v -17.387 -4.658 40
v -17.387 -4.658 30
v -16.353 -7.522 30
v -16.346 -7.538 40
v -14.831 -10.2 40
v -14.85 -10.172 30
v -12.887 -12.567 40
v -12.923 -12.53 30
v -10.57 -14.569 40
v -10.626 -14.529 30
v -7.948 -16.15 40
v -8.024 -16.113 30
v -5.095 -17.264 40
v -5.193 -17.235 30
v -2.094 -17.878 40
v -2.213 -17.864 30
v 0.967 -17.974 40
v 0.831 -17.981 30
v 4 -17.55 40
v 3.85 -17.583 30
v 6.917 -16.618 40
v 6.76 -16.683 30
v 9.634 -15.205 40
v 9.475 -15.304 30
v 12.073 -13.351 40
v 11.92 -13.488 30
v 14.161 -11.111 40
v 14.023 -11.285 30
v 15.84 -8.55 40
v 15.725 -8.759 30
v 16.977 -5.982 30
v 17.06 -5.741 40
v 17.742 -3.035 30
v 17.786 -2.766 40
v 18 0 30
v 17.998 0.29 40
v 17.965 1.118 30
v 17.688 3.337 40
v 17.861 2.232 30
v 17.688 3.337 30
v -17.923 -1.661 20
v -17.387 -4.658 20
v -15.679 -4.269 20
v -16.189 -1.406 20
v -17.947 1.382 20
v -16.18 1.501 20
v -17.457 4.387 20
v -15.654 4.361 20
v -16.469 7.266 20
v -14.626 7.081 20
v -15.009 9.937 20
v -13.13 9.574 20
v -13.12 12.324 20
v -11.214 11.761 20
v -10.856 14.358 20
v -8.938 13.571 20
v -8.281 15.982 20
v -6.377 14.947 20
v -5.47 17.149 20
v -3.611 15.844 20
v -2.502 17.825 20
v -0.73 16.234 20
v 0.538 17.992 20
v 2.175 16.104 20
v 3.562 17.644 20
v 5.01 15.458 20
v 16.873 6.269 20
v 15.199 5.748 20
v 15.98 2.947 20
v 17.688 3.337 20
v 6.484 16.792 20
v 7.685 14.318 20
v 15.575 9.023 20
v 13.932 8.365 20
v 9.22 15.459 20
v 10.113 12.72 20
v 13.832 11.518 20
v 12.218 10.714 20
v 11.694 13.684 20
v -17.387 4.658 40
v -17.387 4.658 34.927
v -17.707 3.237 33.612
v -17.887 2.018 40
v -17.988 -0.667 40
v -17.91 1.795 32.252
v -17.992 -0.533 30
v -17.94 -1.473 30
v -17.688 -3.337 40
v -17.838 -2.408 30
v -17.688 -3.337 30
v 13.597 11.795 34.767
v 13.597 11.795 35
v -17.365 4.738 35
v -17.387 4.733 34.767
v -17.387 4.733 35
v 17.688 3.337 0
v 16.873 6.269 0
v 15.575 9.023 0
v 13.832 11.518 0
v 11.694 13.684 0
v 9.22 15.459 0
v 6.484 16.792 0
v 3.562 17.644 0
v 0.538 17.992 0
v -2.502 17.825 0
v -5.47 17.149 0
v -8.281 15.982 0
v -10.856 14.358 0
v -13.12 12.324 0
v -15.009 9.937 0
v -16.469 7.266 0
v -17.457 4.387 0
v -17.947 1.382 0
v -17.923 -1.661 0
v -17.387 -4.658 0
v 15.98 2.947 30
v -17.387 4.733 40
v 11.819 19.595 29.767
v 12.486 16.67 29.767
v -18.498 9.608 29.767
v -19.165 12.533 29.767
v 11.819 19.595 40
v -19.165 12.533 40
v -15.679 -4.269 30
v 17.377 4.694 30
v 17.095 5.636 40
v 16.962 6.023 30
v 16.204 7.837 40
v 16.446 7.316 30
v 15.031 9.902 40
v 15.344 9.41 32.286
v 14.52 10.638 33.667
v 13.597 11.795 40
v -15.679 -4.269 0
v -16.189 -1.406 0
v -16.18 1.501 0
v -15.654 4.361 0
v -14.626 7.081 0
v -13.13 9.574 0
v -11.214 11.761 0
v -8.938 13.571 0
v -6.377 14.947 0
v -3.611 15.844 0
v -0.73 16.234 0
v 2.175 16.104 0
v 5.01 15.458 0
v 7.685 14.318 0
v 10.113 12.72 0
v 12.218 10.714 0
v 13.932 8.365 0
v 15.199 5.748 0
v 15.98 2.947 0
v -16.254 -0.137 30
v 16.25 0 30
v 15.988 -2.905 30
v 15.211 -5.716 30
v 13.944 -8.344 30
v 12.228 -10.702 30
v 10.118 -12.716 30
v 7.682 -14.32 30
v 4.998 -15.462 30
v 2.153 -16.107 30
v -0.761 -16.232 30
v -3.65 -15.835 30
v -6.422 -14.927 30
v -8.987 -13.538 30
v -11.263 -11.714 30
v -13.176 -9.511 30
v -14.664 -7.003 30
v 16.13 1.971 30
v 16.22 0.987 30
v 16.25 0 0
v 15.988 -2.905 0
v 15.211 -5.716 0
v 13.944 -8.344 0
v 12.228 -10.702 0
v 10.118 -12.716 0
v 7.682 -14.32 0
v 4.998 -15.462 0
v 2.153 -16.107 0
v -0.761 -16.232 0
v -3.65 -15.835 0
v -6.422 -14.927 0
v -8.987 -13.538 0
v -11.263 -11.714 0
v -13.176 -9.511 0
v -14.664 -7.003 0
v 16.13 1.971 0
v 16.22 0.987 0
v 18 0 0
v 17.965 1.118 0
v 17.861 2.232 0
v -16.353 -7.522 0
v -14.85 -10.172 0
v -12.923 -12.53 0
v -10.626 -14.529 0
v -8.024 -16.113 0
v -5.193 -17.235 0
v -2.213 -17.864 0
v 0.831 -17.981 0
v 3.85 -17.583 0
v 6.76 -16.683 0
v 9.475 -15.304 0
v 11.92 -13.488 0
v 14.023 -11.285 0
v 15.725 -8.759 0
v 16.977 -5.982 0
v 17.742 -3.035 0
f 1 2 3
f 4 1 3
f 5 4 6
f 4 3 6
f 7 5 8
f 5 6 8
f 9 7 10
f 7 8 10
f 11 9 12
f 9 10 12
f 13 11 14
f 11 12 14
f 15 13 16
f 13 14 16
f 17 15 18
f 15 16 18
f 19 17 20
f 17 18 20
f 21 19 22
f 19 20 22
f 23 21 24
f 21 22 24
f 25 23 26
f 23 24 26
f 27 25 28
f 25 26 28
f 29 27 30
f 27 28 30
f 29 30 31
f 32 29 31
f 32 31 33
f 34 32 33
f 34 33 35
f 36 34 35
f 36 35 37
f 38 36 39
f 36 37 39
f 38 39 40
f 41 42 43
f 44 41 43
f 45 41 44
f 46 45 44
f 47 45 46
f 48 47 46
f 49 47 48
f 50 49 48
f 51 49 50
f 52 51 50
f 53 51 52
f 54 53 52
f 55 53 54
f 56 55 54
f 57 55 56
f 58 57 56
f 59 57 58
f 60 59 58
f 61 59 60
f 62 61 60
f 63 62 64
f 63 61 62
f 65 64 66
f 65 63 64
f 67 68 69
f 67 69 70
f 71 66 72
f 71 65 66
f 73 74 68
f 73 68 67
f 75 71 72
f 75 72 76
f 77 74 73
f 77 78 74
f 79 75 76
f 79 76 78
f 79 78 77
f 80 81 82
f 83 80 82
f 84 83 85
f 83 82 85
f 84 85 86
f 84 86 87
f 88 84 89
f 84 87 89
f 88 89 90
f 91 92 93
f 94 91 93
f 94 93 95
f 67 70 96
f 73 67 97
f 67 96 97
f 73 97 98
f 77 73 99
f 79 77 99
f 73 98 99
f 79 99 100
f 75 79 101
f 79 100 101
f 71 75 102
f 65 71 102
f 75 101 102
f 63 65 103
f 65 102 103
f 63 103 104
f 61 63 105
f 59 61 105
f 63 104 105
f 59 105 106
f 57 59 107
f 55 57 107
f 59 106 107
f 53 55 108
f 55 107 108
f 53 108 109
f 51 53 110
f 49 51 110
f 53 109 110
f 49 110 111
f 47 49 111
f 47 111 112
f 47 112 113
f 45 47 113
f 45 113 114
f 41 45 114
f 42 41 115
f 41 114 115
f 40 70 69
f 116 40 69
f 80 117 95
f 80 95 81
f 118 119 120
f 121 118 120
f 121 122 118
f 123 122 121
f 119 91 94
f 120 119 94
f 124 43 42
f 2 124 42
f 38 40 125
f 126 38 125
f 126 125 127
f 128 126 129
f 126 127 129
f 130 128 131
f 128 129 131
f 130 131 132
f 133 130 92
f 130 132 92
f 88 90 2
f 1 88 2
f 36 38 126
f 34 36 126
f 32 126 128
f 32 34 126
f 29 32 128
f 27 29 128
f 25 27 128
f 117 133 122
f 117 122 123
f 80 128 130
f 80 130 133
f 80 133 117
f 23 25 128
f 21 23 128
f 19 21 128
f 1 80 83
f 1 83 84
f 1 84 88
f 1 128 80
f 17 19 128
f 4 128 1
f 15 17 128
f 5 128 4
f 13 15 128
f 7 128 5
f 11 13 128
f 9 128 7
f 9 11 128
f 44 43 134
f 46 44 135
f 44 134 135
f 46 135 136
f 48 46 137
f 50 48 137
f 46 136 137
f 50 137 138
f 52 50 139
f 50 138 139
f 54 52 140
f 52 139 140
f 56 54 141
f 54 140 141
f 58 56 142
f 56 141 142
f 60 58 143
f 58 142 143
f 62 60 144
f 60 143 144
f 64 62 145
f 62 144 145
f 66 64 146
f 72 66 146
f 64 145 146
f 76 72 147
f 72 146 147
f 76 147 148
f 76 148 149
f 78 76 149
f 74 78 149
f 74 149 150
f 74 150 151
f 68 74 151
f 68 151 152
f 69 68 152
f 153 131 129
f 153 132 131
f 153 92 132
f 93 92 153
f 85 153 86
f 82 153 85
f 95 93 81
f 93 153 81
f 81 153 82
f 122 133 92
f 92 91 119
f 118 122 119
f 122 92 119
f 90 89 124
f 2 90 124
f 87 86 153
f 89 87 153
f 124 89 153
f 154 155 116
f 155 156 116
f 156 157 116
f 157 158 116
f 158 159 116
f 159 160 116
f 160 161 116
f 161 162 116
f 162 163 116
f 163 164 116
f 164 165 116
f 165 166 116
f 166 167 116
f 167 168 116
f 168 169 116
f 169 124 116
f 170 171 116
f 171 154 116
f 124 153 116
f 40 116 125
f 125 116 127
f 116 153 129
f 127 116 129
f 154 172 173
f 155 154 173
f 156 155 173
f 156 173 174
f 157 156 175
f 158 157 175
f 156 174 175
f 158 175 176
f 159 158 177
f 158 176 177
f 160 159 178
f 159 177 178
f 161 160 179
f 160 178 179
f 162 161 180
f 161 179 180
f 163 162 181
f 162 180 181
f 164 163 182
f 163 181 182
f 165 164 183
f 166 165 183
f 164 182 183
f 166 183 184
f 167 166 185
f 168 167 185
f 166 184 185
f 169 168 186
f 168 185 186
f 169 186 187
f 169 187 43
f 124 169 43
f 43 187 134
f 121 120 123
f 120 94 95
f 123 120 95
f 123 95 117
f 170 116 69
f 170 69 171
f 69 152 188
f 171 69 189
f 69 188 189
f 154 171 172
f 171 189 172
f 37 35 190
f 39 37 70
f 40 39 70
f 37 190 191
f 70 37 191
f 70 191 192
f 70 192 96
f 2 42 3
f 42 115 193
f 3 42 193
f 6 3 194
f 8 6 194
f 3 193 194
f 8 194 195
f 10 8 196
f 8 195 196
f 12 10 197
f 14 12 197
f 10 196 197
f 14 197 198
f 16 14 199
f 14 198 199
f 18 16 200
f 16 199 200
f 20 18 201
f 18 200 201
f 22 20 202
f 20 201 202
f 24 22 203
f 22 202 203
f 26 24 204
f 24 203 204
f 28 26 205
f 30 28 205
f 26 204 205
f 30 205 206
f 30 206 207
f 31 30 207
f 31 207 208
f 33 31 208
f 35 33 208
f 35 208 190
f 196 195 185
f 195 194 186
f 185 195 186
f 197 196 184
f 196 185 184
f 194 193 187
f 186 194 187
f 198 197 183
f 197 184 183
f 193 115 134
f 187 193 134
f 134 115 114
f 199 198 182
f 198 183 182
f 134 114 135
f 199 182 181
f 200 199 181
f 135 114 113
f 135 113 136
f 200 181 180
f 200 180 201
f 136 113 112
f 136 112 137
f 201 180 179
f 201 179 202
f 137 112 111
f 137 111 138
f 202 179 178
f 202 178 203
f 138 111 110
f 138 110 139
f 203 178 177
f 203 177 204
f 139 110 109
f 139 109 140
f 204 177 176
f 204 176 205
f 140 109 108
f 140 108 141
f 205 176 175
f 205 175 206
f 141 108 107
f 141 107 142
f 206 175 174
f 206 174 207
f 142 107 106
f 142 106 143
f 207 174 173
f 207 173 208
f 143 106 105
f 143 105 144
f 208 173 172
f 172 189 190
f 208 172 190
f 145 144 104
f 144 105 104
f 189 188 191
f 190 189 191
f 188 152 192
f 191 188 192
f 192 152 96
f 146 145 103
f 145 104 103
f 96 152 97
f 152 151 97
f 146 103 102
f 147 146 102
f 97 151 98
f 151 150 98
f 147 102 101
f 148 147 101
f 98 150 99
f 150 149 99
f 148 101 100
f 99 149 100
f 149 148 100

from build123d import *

# Parameters (mm, degrees)
F1_DEPTH = 30
F2_DEPTH = 20
F4_DEPTH = 10
F5_SIZE  = 5
F6_W     = 31.7785144259
F6_H     = 10.2327512205
F6_H_2   = 5
F7_DEPTH = 8
F8_SIZE  = 5


with BuildPart() as f1:
    # F0 (on Top) → F1 (new body)
    with BuildSketch(Plane.XY):
        with BuildLine():
            ThreePointArc((15.9804643873, 2.9474154722), (16.182475804, 1.4798570381), (16.25, 0))
            ThreePointArc((16.25, 0), (2.1533060737, -16.1066996294), (-15.6793259019, -4.2686343556))
            Line((-15.6793259019, -4.2686343556), (-17.3869081956, -4.6578346252))
            ThreePointArc((-17.3869081956, -4.6578346252), (2.3490053723, -17.8460688601), (18, 0))
            ThreePointArc((18, 0), (17.9218419848, 1.6755834418), (17.6880466811, 3.3366157419))
            Line((17.6880466811, 3.3366157419), (15.9804643873, 2.9474154722))
        make_face()
    extrude(amount=F1_DEPTH)

    # F0 (on Top) → F2 (join)
    with BuildSketch(Plane.XY):
        with BuildLine():
            ThreePointArc((15.9804643873, 2.9474154722), (16.182475804, 1.4798570381), (16.25, 0))
            ThreePointArc((16.25, 0), (2.1533060737, -16.1066996294), (-15.6793259019, -4.2686343556))
            Line((-15.6793259019, -4.2686343556), (-17.3869081956, -4.6578346252))
            ThreePointArc((-17.3869081956, -4.6578346252), (2.3490053723, -17.8460688601), (18, 0))
            ThreePointArc((18, 0), (17.9218419848, 1.6755834418), (17.6880466811, 3.3366157419))
            Line((17.6880466811, 3.3366157419), (15.9804643873, 2.9474154722))
        make_face()
        with BuildLine():
            ThreePointArc((-15.6793259019, -4.2686343556), (-3.6111653073, 15.8436733469), (15.9804643873, 2.9474154722))
            Line((15.9804643873, 2.9474154722), (17.6880466811, 3.3366157419))
            ThreePointArc((17.6880466811, 3.3366157419), (-4.0000600327, 17.549915092), (-17.3869081956, -4.6578346252))
            Line((-17.3869081956, -4.6578346252), (-15.6793259019, -4.2686343556))
        make_face()
    extrude(amount=F2_DEPTH)

    # F3 (on face) → F4 (join)
    with BuildSketch(Plane.XY.offset(30)):
        with BuildLine():
            ThreePointArc((15.9804643873, 2.9474154722), (3.6111653073, -15.8436733469), (-15.6793259019, -4.2686343556))
            Line((-15.6793259019, -4.2686343556), (-17.3869081956, -4.6578346252))
            ThreePointArc((-17.3869081956, -4.6578346252), (4.0000600327, -17.549915092), (17.6880466811, 3.3366157419))
            Line((17.6880466811, 3.3366157419), (15.9804643873, 2.9474154722))
        make_face()
        with BuildLine():
            Line((-17.3869081956, -4.6578346252), (-15.6793259019, -4.2686343556))
            ThreePointArc((-15.6793259019, -4.2686343556), (3.6111653073, -15.8436733469), (15.9804643873, 2.9474154722))
            Line((15.9804643873, 2.9474154722), (17.6880466811, 3.3366157419))
            ThreePointArc((17.6880466811, 3.3366157419), (16.2041492949, 7.8374450957), (13.5969934668, 11.7949891337))
            Line((13.5969934668, 11.7949891337), (-17.3652541608, 4.7379265435))
            ThreePointArc((-17.3652541608, 4.7379265435), (-17.3761273243, 4.6978930607), (-17.3869081956, 4.6578346252))
            ThreePointArc((-17.3869081956, 4.6578346252), (-17.9872433705, 0.6775514234), (-17.6880466811, -3.3366157419))
            Line((-17.6880466811, -3.3366157419), (-17.3869081956, -4.6578346252))
        make_face()
        with BuildLine():
            Line((-17.3869081956, 4.732991053), (-17.3869081956, 4.6578346252))
            ThreePointArc((-17.3869081956, 4.6578346252), (-17.3761273243, 4.6978930607), (-17.3652541608, 4.7379265435))
            Line((-17.3652541608, 4.7379265435), (-17.3869081956, 4.732991053))
        make_face()
    extrude(amount=F4_DEPTH)

    # F5
    f5_edges = [f1.edges().sort_by_distance(p)[0] for p in [
        (-1.894957, 8.26399, 30),
    ]]
    chamfer(f5_edges, length=F5_SIZE)

    # F6 (on face) → F7 (join)
    with BuildSketch(Plane(origin=(-1.884130347, 8.2664578386, 0), x_dir=(-0.9749952829, -0.2222255574, 0), z_dir=(-0.2222255574, 0.9749952829, 0))):
        with Locations((0.011104687, 34.8836243898)):
            Rectangle(F6_W, F6_H)
        with Locations((0.011104687, 37.5)):
            Rectangle(F6_W, F6_H_2)
    extrude(amount=F7_DEPTH)

    # F8
    f8_edges = [f1.edges().sort_by_distance(p)[0] for p in [
        (-1.894957, 8.26399, 29.767249),
    ]]
    chamfer(f8_edges, length=F8_SIZE)


solid = f1.part
